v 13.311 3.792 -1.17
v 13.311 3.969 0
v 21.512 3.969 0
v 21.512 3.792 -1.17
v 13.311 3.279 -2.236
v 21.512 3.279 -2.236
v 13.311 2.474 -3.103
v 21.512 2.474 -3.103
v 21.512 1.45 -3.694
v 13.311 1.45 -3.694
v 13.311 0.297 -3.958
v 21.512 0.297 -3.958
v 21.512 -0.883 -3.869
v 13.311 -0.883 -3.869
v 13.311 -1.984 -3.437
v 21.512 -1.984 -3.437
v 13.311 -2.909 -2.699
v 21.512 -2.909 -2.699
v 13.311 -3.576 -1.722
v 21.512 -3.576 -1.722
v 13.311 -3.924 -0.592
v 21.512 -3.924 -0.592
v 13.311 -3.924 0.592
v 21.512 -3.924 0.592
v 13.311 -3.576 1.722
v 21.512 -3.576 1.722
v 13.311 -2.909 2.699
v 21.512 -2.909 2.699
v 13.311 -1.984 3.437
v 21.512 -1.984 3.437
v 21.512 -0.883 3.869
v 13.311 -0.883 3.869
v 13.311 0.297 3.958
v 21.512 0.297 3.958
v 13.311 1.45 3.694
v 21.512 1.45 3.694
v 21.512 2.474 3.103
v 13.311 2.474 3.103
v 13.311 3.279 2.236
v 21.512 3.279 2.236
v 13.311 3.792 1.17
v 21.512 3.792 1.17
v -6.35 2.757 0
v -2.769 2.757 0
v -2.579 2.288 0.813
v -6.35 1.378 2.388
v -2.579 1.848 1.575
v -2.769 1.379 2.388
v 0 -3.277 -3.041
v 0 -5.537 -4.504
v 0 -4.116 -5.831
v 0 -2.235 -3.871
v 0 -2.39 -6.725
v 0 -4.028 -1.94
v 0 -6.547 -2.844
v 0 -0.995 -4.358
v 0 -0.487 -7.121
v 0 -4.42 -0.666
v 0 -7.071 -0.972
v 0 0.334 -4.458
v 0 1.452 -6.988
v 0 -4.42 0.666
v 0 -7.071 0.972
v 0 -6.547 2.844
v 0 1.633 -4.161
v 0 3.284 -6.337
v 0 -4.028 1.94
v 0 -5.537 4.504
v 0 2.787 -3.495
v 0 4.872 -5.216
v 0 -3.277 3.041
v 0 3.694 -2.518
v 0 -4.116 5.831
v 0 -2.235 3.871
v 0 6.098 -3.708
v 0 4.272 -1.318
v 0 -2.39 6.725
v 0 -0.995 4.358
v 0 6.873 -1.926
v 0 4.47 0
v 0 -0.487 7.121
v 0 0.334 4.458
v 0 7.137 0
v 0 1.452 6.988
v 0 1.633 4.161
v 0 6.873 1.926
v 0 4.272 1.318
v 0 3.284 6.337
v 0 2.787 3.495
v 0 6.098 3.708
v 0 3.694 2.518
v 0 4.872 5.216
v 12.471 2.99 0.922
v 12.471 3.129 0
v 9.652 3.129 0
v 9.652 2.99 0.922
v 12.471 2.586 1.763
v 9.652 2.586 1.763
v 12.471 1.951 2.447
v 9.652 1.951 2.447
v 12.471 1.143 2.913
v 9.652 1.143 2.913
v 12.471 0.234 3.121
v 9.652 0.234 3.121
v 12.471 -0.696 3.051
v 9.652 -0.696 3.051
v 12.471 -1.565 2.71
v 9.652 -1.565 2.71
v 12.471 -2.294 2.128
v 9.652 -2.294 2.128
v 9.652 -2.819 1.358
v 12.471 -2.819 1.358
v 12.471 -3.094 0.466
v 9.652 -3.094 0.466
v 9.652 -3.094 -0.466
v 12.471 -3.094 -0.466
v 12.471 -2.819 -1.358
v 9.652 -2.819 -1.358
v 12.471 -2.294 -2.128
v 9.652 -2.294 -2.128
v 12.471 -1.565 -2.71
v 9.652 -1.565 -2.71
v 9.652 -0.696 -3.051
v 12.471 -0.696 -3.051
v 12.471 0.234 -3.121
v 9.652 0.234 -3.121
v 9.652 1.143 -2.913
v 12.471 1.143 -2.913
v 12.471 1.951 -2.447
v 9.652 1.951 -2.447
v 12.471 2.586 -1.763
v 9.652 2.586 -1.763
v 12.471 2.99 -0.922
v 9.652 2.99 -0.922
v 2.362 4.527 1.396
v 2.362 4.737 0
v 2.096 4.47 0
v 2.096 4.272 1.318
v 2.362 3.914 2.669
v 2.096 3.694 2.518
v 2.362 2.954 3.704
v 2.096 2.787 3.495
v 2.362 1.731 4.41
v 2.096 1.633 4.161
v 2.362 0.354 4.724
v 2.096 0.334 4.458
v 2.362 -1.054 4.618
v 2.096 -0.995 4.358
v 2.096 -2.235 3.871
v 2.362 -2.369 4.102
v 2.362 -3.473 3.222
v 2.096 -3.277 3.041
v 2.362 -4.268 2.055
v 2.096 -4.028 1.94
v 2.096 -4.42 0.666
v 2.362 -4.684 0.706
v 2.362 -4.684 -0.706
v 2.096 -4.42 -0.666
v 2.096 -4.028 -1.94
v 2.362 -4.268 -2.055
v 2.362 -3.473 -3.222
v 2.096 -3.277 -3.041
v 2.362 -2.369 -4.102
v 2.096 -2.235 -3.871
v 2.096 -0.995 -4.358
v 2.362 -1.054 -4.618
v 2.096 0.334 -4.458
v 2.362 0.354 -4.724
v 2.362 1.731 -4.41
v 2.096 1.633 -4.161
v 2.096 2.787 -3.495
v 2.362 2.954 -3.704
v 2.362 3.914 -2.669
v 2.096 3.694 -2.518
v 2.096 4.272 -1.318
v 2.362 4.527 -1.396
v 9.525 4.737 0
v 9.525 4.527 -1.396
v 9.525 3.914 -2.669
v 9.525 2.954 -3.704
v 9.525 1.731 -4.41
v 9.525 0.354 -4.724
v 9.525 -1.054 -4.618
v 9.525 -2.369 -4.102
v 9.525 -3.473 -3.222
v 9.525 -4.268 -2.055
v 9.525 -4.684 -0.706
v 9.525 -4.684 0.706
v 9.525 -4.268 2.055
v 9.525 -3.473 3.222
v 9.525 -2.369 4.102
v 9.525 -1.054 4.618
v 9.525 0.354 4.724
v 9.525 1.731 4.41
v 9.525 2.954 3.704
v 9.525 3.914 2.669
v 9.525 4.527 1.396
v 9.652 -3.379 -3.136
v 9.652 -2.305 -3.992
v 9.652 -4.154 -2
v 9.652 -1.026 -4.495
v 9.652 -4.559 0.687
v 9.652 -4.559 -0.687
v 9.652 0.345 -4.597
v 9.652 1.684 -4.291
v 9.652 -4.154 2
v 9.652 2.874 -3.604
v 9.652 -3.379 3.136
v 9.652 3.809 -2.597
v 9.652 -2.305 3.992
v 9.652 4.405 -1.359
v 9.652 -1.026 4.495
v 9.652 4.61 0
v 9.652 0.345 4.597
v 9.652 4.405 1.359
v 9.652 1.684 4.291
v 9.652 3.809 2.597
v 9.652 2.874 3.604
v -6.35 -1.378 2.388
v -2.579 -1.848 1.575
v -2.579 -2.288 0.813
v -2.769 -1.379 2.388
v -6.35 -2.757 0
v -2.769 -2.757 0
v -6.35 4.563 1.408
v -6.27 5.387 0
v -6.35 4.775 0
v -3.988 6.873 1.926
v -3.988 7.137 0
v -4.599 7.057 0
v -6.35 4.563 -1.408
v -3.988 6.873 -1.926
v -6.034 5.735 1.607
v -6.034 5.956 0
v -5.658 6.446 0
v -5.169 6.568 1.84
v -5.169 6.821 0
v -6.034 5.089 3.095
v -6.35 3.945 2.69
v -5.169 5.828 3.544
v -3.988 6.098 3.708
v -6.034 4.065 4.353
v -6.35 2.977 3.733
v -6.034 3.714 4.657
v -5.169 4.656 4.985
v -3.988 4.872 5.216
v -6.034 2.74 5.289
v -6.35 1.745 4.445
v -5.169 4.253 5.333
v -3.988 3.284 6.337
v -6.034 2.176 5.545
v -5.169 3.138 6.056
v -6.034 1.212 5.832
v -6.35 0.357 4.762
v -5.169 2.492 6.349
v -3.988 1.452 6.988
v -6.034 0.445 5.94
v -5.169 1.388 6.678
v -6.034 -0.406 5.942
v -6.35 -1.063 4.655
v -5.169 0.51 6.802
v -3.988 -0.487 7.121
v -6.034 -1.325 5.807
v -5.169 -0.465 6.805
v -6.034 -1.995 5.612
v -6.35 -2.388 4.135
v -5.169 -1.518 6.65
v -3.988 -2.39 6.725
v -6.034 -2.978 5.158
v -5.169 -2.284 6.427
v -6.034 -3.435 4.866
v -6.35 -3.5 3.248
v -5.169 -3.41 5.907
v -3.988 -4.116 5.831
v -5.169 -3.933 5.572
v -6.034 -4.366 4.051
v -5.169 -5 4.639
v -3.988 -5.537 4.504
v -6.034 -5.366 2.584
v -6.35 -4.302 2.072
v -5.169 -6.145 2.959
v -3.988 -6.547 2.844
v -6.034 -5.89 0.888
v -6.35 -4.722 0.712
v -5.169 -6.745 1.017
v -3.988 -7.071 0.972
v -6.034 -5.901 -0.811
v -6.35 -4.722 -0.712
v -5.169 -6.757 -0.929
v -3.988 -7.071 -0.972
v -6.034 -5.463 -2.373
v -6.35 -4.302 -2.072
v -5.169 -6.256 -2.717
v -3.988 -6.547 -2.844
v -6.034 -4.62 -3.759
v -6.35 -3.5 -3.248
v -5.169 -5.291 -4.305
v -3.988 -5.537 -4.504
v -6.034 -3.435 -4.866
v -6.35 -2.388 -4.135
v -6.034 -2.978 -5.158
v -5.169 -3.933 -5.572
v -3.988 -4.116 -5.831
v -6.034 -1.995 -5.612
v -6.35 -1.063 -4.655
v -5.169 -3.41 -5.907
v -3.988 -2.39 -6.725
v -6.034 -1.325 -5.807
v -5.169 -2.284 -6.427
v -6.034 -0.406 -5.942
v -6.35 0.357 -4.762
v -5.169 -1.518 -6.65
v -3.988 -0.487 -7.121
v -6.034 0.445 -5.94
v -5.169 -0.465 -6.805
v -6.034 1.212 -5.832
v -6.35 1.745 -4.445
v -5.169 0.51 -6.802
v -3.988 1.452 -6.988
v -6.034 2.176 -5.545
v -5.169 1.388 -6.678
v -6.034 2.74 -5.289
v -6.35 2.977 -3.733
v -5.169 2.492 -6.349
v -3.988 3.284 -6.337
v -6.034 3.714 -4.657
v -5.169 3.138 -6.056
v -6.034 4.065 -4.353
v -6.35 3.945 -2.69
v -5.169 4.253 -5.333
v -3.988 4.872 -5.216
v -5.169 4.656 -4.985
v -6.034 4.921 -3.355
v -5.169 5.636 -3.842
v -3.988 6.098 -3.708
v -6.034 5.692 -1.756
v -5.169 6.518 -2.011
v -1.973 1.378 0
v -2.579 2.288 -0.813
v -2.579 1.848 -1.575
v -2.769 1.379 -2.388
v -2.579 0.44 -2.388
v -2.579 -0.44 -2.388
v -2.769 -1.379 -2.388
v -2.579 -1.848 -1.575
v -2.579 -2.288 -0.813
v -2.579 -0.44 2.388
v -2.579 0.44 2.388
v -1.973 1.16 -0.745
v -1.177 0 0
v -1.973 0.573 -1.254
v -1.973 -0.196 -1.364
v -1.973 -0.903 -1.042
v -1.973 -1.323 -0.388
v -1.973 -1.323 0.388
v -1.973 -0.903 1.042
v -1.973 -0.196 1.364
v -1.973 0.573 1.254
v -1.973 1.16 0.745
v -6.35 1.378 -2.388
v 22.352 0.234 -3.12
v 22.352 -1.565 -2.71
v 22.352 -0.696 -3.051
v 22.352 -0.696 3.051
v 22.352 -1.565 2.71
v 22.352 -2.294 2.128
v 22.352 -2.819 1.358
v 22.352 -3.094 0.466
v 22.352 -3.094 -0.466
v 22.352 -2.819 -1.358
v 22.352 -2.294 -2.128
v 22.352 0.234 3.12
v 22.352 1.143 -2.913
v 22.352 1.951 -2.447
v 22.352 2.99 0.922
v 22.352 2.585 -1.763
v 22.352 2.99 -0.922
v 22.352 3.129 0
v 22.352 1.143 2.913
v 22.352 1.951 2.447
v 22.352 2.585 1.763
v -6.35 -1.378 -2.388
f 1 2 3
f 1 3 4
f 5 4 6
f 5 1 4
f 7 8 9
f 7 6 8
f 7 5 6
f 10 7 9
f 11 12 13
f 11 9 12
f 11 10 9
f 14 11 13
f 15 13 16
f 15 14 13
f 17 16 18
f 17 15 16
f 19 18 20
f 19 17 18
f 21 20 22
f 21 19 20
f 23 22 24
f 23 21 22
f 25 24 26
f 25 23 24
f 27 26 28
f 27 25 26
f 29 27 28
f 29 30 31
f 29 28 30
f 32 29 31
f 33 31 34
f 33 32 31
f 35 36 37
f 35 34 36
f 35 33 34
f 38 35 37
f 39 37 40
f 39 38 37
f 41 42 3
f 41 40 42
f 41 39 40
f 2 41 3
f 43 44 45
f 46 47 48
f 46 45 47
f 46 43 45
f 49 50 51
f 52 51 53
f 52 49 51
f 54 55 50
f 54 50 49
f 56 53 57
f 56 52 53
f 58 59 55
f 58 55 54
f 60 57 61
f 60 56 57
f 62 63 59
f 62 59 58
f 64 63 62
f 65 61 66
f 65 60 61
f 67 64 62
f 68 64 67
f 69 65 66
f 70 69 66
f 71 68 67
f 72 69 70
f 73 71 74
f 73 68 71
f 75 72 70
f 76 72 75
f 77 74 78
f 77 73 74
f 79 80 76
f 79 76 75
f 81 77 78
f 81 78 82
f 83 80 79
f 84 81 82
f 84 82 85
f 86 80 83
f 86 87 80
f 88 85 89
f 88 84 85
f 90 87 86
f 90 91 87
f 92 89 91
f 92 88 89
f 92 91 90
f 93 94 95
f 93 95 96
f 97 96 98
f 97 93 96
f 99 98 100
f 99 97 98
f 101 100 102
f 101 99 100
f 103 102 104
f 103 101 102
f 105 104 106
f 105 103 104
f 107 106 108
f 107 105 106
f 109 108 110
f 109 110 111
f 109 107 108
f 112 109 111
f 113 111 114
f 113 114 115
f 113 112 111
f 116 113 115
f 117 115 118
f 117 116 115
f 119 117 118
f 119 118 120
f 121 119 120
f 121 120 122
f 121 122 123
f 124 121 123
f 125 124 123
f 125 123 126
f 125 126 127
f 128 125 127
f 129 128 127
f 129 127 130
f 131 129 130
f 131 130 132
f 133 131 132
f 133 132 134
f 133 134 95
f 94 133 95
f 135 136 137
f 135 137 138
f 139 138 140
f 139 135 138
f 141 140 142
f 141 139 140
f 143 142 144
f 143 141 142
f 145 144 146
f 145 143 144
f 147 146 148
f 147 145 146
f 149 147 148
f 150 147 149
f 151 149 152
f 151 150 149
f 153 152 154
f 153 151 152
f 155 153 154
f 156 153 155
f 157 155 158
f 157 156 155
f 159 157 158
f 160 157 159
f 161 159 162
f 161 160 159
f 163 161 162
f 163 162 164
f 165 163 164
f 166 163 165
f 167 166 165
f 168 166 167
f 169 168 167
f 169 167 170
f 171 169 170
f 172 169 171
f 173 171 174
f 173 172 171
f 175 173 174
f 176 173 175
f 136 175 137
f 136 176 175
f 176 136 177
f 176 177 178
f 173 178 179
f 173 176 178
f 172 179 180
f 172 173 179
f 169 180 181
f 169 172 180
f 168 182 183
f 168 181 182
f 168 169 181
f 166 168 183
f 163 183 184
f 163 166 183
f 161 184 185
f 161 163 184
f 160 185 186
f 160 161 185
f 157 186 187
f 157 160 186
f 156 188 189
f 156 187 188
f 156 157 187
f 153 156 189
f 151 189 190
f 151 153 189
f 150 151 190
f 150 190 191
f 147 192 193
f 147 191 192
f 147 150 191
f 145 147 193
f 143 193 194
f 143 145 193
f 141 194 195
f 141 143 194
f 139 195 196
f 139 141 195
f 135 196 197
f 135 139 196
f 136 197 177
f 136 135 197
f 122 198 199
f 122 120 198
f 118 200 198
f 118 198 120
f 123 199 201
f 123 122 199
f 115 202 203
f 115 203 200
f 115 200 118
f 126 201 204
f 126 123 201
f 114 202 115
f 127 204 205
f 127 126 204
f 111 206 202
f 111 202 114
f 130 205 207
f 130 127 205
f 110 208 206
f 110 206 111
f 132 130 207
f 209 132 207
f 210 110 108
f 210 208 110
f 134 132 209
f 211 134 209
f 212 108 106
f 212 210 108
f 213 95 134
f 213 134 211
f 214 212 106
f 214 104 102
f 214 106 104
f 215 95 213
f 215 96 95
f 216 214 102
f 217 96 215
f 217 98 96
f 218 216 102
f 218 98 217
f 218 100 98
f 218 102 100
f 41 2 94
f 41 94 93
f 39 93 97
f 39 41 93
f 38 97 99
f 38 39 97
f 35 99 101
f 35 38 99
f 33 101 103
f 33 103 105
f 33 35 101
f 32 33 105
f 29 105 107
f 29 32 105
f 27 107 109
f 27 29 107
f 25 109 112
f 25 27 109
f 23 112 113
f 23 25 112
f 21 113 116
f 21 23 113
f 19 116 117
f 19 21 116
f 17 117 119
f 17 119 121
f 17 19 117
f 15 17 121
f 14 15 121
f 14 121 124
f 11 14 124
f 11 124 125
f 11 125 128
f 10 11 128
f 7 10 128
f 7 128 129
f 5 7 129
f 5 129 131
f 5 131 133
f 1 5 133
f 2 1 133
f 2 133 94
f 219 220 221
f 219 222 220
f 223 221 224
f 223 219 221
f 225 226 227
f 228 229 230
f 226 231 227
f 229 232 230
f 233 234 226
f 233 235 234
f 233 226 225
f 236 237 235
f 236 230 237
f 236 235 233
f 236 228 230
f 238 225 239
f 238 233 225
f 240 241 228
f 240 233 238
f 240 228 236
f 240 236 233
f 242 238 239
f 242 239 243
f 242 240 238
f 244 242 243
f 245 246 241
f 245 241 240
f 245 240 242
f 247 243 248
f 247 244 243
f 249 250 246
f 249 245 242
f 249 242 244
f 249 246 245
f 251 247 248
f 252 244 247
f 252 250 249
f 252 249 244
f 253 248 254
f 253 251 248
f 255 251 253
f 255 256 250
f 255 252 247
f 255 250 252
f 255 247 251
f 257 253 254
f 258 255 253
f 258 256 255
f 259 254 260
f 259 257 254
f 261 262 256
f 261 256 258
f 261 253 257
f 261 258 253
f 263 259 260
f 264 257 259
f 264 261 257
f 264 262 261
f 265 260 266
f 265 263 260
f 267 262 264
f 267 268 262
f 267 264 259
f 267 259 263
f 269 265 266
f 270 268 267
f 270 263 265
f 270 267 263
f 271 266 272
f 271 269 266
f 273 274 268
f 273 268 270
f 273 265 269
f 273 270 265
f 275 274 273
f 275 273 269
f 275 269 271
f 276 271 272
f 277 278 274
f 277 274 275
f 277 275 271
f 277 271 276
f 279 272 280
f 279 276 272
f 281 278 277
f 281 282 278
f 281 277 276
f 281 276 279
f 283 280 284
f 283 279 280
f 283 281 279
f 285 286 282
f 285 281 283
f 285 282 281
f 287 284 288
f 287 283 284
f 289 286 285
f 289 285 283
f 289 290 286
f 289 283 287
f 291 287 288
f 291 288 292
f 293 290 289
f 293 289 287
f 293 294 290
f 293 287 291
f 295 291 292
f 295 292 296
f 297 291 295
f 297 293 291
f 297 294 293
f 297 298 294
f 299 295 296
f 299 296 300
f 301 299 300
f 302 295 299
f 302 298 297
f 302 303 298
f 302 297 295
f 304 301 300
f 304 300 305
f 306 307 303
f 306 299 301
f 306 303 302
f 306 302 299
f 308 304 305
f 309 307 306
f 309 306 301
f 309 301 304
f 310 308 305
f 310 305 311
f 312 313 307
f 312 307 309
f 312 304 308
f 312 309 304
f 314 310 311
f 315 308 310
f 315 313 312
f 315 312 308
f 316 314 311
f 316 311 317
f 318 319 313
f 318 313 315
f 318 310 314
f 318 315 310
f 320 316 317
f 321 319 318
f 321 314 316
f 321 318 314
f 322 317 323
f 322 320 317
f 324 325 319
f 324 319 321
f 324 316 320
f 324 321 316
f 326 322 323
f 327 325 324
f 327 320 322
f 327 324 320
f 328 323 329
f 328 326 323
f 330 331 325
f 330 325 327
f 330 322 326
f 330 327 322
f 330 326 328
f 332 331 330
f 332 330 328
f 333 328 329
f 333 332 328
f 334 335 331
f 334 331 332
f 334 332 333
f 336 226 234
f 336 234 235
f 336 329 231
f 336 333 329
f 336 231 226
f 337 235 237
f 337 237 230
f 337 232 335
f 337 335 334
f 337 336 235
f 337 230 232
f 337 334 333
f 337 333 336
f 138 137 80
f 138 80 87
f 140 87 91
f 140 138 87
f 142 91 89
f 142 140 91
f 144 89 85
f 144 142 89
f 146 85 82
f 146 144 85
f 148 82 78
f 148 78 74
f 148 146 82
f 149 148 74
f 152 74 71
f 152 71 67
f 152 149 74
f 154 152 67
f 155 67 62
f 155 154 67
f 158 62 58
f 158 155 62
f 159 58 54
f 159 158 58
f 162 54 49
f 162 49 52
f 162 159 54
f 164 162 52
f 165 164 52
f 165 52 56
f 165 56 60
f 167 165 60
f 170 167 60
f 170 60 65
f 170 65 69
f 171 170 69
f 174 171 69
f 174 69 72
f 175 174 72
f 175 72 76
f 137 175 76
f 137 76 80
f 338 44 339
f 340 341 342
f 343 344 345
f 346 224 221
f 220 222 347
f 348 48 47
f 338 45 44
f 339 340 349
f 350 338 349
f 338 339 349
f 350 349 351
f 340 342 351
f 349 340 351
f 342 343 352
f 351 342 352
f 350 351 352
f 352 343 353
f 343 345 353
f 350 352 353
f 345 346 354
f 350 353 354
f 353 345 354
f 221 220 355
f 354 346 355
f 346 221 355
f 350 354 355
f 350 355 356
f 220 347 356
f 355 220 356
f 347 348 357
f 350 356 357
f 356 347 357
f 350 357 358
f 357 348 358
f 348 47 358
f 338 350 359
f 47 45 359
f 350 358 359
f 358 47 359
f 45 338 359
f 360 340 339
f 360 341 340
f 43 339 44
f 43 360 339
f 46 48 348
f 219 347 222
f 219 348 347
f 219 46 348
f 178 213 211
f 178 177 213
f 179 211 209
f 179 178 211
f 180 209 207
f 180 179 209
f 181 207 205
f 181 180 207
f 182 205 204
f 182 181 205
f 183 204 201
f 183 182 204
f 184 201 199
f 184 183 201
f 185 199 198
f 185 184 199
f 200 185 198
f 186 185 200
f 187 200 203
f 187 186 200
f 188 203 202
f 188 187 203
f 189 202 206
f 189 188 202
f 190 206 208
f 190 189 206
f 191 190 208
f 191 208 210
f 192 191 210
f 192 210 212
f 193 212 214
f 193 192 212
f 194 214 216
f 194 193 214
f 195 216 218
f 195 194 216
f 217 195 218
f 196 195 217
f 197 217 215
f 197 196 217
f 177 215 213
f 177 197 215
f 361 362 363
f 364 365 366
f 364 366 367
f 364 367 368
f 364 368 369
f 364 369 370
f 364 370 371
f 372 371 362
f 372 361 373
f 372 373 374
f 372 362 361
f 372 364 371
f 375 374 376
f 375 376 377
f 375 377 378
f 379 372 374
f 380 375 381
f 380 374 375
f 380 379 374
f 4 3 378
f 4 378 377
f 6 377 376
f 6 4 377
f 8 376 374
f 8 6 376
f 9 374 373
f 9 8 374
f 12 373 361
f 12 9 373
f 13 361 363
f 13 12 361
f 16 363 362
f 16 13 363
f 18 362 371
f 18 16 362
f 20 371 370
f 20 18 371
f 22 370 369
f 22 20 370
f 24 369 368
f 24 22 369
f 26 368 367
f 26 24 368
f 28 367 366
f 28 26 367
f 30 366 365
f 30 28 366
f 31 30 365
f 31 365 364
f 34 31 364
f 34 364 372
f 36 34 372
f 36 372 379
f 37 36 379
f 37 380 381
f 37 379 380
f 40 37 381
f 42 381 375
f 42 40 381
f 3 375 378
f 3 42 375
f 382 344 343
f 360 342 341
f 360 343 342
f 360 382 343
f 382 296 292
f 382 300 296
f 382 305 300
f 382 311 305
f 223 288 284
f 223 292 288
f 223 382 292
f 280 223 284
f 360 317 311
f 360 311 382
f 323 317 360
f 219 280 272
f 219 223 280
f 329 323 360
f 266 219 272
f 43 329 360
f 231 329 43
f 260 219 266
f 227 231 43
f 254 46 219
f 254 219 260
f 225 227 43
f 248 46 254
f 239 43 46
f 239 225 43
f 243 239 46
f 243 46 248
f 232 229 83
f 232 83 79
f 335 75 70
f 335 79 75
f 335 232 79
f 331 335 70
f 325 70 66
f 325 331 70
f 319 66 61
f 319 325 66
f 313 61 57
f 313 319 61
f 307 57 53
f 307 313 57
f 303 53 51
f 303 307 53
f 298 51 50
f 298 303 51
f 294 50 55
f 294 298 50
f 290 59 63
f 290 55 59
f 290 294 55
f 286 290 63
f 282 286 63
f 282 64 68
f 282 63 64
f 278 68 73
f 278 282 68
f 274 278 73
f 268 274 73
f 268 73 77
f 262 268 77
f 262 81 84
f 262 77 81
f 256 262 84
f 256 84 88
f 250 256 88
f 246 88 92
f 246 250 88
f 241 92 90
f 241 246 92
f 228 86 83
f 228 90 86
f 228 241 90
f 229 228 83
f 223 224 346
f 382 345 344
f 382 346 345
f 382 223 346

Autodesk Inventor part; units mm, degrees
ref_plane "YZ Plane" through (0, 0, 0) normal (1, 0, 0) x (0, 1, 0)
ref_plane "XZ Plane" through (0, 0, 0) normal (0, 1, 0) x (-1, 0, 0)
ref_plane "XY Plane" through (0, 0, 0) normal (0, 0, 1) x (1, 0, 0)
sketch "Sketch1" plane through (0, 0, 0) normal (0, 0, 1) x (1, 0, 0)
  line L0 (-1.1769, 0) -> (22.352, 0)
  line L1 (22.352, 0) -> (22.352, 3.9687)
  line L2 (22.352, 3.9687) -> (9.652, 3.9687)
  line L3 (9.652, 3.9687) -> (9.652, 4.7371)
  line L4 (9.652, 4.7371) -> (0, 4.7371)
  line L5 (0, 4.7371) -> (0, 7.1374)
  line L6 (0, 7.1374) -> (-6.35, 7.1374)
  line L7 (-6.35, 7.1374) -> (-6.35, 2.757)
  line L8 (-6.35, 2.757) -> (-2.7686, 2.757)
  line L9 (-2.7686, 2.757) -> (-1.1769, 0)
  line L10 (-12.0904, 0) -> (28.0924, 0) projected
  line L11 (0, -1.4275) -> (0, 8.5649) projected
  line L12 (0, 4.4704) -> (2.0955, 4.4704)
  line L13 (2.0955, 4.4704) -> (2.3622, 4.7371)
  line L14 (9.652, 3.9687) -> (9.652, 3.1293)
  line L15 (9.652, 3.1293) -> (12.4714, 3.1293)
  line L16 (12.4714, 3.1293) -> (13.3109, 3.9687)
  line L17 (0, 4.4704) -> (0, 4.7371)
  dimension "d0" = 7.9375
  dimension "d1" = 9.4742
  dimension "d2" = 14.2748
  dimension "d3" = 5.5139
  dimension "d5" = 12.7
  dimension "d6" = 6.35
  dimension "d7" = 3.5814
  dimension "d8" = 60
  dimension "d9" = 22.352
  dimension "d19" = 45
  dimension "d20" = 8.9408
  dimension "d21" = 6.2586
  dimension "d22" = 45
  dimension "d23" = 2.8194
  dimension "d34" = 2.3622
revolve "Body" add sketch "Sketch1" angle 360 about axis through (-1.1769, 0, 0) along (1, 0, 0)
sketch "Sketch2" plane through (-6.35, 0, 0) normal (-1, 0, 0) x (0, 0, 1)
  circle A0 centre (0, 0) radius 2.757 projected
  line L0 (0, 2.757) -> (2.3876, 1.3785)
  line L1 (2.3876, 1.3785) -> (2.3876, -1.3785)
  line L2 (2.3876, -1.3785) -> (0, -2.757)
  line L3 (0, -2.757) -> (-2.3876, -1.3785)
  line L4 (-2.3876, -1.3785) -> (-2.3876, 1.3785)
  line L5 (-2.3876, 1.3785) -> (0, 2.757)
extrude "Slot" add sketch "Sketch2" against normal up to next contours A0 L1 | L0 A0 | A0 L2 | L5 A0 | A0 L3 | L4 A0
fillet "Fillet1" radius 2.3622 1 edges at (-6.35, -7.1374, 0)
thread "Thread" size "5/16-18 UNC" class "2A" standard "ANSI Unified Screw Threads" length 12.7
chamfer "Chamfer1" distance 0.8395 distance2 0.8395 1 edges at (22.352, -3.9687, 0) measured on face at (22.352, 0.1595, 1.1606)
chamfer "Chamfer2" distance 0.127 angle 45 1 edges at (9.652, -4.7371, 0) measured on face at (9.652, 4.3967, -0.6945)
revolve "Groove1" cut sketch "Sketch1" angle 360 about axis through (-1.1769, 0, 0) along (1, 0, 0) contours L11 L4 L13 L12
revolve "Groove2" cut sketch "Sketch1" angle 360 about axis through (-1.1769, 0, 0) along (1, 0, 0) contours L16 L15 L14 L2
equation "\"d0\" = NND"
equation "\"d1\" = BDM"
equation "\"d2\" = KOD"
equation "\"d3\" = 1.1547 * SW"
equation "\"d5\" = GEL"
equation "\"d6\" = KOH"
equation "\"d7\" = INTI + LOTI"
equation "\"d8\" = 0.5 * ANG"
equation "\"d9\" = NLG"
equation "\"d19\" = FAWI4"
equation "\"d20\" = BDMM"
equation "\"d21\" = GD1"
equation "\"d22\" = FAWI2"
equation "\"d23\" = GAL"
equation "\"d34\" = GAL2"
equation "\"d13\" = RR"
equation "\"d25\" = GEL"
equation "\"d14\" = -0.5 * SPD + 0.5 * NND"
equation "\"d15\" = GUL"
equation "\"d32\" = -0.5 * NND + 0.5 * BDM"
equation "\"NND\" = 7.9375"
equation "\"NLG\" = 22.352"
equation "\"GEL\" = 12.7"
equation "\"KOD\" = 14.2748"
equation "\"KOH\" = 6.35"
equation "\"INTI\" = 3.5814"
equation "\"GAL\" = 2.8194"
equation "\"GUL\" = 0.83947"
equation "\"SPD\" = GD1"
equation "\"BDM\" = 9.4742"
equation "\"ANG\" = 120deg"
equation "\"FAWI2\" = 45deg"
equation "\"FAWI3\" = 45deg"
equation "\"FAWI4\" = 45deg"
equation "\"RR\" = 2.3622"
equation "\"SW\" = 4.7752"
equation "\"BDMM\" = 8.9408"
equation "\"GAL2\" = RR"
equation "\"LOTI\" = 0"
equation "\"GD1\" = 6.25856"
equation "\"BOR\" = SW"
equation "\"SLG\" = 9.652"
equation "\"THREADDIA\" = 7.9375"
equation "\"E0\" = 1.155 * SW"
equation "\"FAWI1\" = 45deg"
equation "\"TOA\" = 30deg"
equation "\"PHH\" = RR"
equation "\"HHPTC\" = 1.41122"
equation "\"GD0\" = 6.0198"
equation "\"KOH1\" = 5.3086"
equation "\"BDMN\" = 9.525"
properties part number "ANSI B18.3 - 0.375 x 0.38 ANSI B18.3" material "Steel, Mild"
